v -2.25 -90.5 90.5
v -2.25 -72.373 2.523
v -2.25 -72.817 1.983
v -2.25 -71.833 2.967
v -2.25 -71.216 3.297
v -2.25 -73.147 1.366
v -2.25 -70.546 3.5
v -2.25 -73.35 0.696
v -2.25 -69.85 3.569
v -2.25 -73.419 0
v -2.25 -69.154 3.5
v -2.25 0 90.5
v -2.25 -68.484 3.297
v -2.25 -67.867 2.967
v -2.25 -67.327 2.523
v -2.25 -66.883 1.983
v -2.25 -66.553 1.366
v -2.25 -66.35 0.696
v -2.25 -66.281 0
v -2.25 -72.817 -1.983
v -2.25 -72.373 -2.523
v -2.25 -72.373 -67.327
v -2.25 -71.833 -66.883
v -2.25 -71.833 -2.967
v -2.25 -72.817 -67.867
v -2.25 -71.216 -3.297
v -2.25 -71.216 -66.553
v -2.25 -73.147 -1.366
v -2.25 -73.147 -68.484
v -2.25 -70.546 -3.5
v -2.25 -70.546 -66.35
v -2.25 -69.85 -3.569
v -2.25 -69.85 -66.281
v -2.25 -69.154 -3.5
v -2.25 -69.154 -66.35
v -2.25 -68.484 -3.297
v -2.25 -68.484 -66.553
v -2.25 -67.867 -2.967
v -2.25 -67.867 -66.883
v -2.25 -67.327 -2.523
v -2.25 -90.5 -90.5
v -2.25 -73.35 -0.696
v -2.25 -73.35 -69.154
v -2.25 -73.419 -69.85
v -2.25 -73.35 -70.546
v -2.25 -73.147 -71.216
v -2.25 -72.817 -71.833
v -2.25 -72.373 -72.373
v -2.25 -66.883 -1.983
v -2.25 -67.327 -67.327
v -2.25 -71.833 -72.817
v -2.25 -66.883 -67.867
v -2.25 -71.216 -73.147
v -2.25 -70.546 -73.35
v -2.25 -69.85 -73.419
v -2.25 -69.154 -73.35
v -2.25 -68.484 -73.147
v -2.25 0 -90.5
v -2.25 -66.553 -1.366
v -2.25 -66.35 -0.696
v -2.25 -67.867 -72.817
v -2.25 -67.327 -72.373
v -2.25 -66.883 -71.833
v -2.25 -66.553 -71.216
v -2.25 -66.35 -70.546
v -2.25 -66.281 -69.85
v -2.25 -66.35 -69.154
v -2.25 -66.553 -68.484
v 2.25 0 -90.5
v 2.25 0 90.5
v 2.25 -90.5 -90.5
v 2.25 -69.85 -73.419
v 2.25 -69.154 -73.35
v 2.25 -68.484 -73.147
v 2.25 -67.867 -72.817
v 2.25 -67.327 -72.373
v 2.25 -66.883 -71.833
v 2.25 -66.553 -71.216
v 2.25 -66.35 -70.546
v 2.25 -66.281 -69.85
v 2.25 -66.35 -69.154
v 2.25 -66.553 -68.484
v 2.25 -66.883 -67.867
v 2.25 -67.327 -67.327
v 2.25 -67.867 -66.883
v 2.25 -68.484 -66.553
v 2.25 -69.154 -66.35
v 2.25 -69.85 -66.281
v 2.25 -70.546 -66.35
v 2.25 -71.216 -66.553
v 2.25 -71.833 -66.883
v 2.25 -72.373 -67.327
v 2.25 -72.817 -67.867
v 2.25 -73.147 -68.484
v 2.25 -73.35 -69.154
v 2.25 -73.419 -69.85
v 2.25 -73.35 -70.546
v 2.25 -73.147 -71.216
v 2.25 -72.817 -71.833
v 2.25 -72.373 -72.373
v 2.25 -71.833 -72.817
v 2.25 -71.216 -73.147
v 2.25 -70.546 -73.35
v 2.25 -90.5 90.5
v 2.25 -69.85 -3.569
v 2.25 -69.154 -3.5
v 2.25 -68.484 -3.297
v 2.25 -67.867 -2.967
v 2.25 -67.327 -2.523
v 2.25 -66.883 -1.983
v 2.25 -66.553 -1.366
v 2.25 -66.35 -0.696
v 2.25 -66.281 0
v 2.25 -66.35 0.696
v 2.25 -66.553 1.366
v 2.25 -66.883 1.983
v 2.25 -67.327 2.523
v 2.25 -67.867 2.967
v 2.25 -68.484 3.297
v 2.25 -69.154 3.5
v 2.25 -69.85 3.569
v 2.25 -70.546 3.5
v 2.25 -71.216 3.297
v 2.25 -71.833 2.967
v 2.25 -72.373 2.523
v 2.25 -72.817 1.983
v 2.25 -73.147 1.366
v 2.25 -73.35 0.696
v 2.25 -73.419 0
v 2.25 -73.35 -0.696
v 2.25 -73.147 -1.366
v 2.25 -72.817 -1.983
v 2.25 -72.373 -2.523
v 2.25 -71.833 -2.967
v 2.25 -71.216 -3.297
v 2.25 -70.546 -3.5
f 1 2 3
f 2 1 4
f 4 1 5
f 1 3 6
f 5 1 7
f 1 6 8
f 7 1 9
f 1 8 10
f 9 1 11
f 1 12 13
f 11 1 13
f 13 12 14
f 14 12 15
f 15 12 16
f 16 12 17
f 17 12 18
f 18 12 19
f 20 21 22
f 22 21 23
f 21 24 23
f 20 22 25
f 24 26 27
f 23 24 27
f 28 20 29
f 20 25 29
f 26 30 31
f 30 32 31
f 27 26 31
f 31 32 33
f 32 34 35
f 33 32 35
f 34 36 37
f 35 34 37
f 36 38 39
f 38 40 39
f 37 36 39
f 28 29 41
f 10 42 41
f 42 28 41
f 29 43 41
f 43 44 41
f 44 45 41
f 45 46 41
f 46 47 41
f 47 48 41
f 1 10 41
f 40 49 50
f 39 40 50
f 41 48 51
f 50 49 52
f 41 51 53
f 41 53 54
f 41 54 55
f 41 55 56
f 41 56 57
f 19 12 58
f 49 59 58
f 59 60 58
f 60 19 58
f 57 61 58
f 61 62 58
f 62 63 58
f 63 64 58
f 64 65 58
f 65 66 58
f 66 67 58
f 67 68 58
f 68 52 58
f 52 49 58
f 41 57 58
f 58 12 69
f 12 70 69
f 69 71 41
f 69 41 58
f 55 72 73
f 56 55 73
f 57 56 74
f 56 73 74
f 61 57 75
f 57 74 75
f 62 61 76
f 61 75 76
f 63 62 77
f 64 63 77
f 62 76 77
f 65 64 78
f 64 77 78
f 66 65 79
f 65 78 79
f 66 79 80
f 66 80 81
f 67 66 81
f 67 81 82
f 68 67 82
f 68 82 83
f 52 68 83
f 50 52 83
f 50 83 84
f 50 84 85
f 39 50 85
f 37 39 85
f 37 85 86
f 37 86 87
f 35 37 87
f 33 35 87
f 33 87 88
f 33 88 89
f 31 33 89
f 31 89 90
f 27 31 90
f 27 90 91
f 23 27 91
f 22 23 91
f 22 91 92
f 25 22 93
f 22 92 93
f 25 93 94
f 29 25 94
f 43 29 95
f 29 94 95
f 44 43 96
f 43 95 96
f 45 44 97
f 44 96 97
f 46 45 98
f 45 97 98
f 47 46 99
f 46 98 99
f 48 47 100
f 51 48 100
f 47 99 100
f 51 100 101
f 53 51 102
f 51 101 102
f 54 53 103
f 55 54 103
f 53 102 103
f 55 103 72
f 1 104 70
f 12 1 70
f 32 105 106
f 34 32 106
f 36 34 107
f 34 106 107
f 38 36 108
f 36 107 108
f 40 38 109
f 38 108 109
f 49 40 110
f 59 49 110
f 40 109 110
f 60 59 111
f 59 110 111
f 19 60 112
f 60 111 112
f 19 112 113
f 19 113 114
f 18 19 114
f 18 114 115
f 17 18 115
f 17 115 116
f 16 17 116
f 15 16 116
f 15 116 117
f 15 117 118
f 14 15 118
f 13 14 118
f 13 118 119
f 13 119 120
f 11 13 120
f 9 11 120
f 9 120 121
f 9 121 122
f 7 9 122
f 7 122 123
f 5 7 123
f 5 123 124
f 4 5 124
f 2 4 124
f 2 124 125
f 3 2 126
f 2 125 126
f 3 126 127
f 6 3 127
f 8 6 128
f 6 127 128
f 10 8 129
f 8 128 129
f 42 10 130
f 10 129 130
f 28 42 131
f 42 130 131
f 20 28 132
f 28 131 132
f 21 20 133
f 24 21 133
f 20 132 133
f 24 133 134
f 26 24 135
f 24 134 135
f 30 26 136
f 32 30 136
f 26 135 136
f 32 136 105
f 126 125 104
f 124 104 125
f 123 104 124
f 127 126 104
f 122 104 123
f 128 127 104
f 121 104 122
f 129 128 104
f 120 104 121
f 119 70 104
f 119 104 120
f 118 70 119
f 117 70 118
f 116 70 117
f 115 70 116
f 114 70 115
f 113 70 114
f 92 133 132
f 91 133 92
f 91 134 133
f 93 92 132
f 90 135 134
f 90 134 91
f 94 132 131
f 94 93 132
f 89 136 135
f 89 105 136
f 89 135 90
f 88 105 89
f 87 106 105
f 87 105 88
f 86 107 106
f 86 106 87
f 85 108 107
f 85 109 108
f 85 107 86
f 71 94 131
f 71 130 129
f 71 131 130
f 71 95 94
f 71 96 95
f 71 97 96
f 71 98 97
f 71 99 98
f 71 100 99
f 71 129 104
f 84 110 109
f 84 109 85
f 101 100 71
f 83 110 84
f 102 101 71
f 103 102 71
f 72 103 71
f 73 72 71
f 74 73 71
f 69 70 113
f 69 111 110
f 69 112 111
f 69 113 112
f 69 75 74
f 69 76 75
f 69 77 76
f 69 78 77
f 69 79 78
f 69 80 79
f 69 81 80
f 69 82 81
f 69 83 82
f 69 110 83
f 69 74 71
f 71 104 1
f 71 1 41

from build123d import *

# Parameters (mm, degrees)
SKETCH1_W               = 181
SKETCH1_H               = 90.5
BOSS_EXTRUDE1_DEPTH     = 2.25
SKETCH2_R               = 3.5687
CUT_EXTRUDE1_DEPTH      = 1
CUT_EXTRUDE1_DEPTH_BACK = 91.5


with BuildPart() as part:
    # Sketch1 → Boss-Extrude1 (new body, symmetric)
    with BuildSketch(Plane(origin=(0, 0, 0), x_dir=(0, 0, -1), z_dir=(1, 0, 0))):
        with Locations((0, -45.25)):
            Rectangle(SKETCH1_W, SKETCH1_H)
    extrude(amount=BOSS_EXTRUDE1_DEPTH, both=True)

    # Sketch2 → Cut-Extrude1 (cut, two sides)
    with BuildSketch(Plane(origin=(88.25, 0, 0), x_dir=(0, 0, -1), z_dir=(1, 0, 0))) as cut_extrude1_sk:
        with Locations((0, -69.85)):
            Circle(SKETCH2_R)
        with Locations((69.85, -69.85)):
            Circle(SKETCH2_R)
    extrude(amount=CUT_EXTRUDE1_DEPTH, mode=Mode.SUBTRACT)
    extrude(cut_extrude1_sk.sketch, amount=-CUT_EXTRUDE1_DEPTH_BACK, mode=Mode.SUBTRACT)


solid = part.part
